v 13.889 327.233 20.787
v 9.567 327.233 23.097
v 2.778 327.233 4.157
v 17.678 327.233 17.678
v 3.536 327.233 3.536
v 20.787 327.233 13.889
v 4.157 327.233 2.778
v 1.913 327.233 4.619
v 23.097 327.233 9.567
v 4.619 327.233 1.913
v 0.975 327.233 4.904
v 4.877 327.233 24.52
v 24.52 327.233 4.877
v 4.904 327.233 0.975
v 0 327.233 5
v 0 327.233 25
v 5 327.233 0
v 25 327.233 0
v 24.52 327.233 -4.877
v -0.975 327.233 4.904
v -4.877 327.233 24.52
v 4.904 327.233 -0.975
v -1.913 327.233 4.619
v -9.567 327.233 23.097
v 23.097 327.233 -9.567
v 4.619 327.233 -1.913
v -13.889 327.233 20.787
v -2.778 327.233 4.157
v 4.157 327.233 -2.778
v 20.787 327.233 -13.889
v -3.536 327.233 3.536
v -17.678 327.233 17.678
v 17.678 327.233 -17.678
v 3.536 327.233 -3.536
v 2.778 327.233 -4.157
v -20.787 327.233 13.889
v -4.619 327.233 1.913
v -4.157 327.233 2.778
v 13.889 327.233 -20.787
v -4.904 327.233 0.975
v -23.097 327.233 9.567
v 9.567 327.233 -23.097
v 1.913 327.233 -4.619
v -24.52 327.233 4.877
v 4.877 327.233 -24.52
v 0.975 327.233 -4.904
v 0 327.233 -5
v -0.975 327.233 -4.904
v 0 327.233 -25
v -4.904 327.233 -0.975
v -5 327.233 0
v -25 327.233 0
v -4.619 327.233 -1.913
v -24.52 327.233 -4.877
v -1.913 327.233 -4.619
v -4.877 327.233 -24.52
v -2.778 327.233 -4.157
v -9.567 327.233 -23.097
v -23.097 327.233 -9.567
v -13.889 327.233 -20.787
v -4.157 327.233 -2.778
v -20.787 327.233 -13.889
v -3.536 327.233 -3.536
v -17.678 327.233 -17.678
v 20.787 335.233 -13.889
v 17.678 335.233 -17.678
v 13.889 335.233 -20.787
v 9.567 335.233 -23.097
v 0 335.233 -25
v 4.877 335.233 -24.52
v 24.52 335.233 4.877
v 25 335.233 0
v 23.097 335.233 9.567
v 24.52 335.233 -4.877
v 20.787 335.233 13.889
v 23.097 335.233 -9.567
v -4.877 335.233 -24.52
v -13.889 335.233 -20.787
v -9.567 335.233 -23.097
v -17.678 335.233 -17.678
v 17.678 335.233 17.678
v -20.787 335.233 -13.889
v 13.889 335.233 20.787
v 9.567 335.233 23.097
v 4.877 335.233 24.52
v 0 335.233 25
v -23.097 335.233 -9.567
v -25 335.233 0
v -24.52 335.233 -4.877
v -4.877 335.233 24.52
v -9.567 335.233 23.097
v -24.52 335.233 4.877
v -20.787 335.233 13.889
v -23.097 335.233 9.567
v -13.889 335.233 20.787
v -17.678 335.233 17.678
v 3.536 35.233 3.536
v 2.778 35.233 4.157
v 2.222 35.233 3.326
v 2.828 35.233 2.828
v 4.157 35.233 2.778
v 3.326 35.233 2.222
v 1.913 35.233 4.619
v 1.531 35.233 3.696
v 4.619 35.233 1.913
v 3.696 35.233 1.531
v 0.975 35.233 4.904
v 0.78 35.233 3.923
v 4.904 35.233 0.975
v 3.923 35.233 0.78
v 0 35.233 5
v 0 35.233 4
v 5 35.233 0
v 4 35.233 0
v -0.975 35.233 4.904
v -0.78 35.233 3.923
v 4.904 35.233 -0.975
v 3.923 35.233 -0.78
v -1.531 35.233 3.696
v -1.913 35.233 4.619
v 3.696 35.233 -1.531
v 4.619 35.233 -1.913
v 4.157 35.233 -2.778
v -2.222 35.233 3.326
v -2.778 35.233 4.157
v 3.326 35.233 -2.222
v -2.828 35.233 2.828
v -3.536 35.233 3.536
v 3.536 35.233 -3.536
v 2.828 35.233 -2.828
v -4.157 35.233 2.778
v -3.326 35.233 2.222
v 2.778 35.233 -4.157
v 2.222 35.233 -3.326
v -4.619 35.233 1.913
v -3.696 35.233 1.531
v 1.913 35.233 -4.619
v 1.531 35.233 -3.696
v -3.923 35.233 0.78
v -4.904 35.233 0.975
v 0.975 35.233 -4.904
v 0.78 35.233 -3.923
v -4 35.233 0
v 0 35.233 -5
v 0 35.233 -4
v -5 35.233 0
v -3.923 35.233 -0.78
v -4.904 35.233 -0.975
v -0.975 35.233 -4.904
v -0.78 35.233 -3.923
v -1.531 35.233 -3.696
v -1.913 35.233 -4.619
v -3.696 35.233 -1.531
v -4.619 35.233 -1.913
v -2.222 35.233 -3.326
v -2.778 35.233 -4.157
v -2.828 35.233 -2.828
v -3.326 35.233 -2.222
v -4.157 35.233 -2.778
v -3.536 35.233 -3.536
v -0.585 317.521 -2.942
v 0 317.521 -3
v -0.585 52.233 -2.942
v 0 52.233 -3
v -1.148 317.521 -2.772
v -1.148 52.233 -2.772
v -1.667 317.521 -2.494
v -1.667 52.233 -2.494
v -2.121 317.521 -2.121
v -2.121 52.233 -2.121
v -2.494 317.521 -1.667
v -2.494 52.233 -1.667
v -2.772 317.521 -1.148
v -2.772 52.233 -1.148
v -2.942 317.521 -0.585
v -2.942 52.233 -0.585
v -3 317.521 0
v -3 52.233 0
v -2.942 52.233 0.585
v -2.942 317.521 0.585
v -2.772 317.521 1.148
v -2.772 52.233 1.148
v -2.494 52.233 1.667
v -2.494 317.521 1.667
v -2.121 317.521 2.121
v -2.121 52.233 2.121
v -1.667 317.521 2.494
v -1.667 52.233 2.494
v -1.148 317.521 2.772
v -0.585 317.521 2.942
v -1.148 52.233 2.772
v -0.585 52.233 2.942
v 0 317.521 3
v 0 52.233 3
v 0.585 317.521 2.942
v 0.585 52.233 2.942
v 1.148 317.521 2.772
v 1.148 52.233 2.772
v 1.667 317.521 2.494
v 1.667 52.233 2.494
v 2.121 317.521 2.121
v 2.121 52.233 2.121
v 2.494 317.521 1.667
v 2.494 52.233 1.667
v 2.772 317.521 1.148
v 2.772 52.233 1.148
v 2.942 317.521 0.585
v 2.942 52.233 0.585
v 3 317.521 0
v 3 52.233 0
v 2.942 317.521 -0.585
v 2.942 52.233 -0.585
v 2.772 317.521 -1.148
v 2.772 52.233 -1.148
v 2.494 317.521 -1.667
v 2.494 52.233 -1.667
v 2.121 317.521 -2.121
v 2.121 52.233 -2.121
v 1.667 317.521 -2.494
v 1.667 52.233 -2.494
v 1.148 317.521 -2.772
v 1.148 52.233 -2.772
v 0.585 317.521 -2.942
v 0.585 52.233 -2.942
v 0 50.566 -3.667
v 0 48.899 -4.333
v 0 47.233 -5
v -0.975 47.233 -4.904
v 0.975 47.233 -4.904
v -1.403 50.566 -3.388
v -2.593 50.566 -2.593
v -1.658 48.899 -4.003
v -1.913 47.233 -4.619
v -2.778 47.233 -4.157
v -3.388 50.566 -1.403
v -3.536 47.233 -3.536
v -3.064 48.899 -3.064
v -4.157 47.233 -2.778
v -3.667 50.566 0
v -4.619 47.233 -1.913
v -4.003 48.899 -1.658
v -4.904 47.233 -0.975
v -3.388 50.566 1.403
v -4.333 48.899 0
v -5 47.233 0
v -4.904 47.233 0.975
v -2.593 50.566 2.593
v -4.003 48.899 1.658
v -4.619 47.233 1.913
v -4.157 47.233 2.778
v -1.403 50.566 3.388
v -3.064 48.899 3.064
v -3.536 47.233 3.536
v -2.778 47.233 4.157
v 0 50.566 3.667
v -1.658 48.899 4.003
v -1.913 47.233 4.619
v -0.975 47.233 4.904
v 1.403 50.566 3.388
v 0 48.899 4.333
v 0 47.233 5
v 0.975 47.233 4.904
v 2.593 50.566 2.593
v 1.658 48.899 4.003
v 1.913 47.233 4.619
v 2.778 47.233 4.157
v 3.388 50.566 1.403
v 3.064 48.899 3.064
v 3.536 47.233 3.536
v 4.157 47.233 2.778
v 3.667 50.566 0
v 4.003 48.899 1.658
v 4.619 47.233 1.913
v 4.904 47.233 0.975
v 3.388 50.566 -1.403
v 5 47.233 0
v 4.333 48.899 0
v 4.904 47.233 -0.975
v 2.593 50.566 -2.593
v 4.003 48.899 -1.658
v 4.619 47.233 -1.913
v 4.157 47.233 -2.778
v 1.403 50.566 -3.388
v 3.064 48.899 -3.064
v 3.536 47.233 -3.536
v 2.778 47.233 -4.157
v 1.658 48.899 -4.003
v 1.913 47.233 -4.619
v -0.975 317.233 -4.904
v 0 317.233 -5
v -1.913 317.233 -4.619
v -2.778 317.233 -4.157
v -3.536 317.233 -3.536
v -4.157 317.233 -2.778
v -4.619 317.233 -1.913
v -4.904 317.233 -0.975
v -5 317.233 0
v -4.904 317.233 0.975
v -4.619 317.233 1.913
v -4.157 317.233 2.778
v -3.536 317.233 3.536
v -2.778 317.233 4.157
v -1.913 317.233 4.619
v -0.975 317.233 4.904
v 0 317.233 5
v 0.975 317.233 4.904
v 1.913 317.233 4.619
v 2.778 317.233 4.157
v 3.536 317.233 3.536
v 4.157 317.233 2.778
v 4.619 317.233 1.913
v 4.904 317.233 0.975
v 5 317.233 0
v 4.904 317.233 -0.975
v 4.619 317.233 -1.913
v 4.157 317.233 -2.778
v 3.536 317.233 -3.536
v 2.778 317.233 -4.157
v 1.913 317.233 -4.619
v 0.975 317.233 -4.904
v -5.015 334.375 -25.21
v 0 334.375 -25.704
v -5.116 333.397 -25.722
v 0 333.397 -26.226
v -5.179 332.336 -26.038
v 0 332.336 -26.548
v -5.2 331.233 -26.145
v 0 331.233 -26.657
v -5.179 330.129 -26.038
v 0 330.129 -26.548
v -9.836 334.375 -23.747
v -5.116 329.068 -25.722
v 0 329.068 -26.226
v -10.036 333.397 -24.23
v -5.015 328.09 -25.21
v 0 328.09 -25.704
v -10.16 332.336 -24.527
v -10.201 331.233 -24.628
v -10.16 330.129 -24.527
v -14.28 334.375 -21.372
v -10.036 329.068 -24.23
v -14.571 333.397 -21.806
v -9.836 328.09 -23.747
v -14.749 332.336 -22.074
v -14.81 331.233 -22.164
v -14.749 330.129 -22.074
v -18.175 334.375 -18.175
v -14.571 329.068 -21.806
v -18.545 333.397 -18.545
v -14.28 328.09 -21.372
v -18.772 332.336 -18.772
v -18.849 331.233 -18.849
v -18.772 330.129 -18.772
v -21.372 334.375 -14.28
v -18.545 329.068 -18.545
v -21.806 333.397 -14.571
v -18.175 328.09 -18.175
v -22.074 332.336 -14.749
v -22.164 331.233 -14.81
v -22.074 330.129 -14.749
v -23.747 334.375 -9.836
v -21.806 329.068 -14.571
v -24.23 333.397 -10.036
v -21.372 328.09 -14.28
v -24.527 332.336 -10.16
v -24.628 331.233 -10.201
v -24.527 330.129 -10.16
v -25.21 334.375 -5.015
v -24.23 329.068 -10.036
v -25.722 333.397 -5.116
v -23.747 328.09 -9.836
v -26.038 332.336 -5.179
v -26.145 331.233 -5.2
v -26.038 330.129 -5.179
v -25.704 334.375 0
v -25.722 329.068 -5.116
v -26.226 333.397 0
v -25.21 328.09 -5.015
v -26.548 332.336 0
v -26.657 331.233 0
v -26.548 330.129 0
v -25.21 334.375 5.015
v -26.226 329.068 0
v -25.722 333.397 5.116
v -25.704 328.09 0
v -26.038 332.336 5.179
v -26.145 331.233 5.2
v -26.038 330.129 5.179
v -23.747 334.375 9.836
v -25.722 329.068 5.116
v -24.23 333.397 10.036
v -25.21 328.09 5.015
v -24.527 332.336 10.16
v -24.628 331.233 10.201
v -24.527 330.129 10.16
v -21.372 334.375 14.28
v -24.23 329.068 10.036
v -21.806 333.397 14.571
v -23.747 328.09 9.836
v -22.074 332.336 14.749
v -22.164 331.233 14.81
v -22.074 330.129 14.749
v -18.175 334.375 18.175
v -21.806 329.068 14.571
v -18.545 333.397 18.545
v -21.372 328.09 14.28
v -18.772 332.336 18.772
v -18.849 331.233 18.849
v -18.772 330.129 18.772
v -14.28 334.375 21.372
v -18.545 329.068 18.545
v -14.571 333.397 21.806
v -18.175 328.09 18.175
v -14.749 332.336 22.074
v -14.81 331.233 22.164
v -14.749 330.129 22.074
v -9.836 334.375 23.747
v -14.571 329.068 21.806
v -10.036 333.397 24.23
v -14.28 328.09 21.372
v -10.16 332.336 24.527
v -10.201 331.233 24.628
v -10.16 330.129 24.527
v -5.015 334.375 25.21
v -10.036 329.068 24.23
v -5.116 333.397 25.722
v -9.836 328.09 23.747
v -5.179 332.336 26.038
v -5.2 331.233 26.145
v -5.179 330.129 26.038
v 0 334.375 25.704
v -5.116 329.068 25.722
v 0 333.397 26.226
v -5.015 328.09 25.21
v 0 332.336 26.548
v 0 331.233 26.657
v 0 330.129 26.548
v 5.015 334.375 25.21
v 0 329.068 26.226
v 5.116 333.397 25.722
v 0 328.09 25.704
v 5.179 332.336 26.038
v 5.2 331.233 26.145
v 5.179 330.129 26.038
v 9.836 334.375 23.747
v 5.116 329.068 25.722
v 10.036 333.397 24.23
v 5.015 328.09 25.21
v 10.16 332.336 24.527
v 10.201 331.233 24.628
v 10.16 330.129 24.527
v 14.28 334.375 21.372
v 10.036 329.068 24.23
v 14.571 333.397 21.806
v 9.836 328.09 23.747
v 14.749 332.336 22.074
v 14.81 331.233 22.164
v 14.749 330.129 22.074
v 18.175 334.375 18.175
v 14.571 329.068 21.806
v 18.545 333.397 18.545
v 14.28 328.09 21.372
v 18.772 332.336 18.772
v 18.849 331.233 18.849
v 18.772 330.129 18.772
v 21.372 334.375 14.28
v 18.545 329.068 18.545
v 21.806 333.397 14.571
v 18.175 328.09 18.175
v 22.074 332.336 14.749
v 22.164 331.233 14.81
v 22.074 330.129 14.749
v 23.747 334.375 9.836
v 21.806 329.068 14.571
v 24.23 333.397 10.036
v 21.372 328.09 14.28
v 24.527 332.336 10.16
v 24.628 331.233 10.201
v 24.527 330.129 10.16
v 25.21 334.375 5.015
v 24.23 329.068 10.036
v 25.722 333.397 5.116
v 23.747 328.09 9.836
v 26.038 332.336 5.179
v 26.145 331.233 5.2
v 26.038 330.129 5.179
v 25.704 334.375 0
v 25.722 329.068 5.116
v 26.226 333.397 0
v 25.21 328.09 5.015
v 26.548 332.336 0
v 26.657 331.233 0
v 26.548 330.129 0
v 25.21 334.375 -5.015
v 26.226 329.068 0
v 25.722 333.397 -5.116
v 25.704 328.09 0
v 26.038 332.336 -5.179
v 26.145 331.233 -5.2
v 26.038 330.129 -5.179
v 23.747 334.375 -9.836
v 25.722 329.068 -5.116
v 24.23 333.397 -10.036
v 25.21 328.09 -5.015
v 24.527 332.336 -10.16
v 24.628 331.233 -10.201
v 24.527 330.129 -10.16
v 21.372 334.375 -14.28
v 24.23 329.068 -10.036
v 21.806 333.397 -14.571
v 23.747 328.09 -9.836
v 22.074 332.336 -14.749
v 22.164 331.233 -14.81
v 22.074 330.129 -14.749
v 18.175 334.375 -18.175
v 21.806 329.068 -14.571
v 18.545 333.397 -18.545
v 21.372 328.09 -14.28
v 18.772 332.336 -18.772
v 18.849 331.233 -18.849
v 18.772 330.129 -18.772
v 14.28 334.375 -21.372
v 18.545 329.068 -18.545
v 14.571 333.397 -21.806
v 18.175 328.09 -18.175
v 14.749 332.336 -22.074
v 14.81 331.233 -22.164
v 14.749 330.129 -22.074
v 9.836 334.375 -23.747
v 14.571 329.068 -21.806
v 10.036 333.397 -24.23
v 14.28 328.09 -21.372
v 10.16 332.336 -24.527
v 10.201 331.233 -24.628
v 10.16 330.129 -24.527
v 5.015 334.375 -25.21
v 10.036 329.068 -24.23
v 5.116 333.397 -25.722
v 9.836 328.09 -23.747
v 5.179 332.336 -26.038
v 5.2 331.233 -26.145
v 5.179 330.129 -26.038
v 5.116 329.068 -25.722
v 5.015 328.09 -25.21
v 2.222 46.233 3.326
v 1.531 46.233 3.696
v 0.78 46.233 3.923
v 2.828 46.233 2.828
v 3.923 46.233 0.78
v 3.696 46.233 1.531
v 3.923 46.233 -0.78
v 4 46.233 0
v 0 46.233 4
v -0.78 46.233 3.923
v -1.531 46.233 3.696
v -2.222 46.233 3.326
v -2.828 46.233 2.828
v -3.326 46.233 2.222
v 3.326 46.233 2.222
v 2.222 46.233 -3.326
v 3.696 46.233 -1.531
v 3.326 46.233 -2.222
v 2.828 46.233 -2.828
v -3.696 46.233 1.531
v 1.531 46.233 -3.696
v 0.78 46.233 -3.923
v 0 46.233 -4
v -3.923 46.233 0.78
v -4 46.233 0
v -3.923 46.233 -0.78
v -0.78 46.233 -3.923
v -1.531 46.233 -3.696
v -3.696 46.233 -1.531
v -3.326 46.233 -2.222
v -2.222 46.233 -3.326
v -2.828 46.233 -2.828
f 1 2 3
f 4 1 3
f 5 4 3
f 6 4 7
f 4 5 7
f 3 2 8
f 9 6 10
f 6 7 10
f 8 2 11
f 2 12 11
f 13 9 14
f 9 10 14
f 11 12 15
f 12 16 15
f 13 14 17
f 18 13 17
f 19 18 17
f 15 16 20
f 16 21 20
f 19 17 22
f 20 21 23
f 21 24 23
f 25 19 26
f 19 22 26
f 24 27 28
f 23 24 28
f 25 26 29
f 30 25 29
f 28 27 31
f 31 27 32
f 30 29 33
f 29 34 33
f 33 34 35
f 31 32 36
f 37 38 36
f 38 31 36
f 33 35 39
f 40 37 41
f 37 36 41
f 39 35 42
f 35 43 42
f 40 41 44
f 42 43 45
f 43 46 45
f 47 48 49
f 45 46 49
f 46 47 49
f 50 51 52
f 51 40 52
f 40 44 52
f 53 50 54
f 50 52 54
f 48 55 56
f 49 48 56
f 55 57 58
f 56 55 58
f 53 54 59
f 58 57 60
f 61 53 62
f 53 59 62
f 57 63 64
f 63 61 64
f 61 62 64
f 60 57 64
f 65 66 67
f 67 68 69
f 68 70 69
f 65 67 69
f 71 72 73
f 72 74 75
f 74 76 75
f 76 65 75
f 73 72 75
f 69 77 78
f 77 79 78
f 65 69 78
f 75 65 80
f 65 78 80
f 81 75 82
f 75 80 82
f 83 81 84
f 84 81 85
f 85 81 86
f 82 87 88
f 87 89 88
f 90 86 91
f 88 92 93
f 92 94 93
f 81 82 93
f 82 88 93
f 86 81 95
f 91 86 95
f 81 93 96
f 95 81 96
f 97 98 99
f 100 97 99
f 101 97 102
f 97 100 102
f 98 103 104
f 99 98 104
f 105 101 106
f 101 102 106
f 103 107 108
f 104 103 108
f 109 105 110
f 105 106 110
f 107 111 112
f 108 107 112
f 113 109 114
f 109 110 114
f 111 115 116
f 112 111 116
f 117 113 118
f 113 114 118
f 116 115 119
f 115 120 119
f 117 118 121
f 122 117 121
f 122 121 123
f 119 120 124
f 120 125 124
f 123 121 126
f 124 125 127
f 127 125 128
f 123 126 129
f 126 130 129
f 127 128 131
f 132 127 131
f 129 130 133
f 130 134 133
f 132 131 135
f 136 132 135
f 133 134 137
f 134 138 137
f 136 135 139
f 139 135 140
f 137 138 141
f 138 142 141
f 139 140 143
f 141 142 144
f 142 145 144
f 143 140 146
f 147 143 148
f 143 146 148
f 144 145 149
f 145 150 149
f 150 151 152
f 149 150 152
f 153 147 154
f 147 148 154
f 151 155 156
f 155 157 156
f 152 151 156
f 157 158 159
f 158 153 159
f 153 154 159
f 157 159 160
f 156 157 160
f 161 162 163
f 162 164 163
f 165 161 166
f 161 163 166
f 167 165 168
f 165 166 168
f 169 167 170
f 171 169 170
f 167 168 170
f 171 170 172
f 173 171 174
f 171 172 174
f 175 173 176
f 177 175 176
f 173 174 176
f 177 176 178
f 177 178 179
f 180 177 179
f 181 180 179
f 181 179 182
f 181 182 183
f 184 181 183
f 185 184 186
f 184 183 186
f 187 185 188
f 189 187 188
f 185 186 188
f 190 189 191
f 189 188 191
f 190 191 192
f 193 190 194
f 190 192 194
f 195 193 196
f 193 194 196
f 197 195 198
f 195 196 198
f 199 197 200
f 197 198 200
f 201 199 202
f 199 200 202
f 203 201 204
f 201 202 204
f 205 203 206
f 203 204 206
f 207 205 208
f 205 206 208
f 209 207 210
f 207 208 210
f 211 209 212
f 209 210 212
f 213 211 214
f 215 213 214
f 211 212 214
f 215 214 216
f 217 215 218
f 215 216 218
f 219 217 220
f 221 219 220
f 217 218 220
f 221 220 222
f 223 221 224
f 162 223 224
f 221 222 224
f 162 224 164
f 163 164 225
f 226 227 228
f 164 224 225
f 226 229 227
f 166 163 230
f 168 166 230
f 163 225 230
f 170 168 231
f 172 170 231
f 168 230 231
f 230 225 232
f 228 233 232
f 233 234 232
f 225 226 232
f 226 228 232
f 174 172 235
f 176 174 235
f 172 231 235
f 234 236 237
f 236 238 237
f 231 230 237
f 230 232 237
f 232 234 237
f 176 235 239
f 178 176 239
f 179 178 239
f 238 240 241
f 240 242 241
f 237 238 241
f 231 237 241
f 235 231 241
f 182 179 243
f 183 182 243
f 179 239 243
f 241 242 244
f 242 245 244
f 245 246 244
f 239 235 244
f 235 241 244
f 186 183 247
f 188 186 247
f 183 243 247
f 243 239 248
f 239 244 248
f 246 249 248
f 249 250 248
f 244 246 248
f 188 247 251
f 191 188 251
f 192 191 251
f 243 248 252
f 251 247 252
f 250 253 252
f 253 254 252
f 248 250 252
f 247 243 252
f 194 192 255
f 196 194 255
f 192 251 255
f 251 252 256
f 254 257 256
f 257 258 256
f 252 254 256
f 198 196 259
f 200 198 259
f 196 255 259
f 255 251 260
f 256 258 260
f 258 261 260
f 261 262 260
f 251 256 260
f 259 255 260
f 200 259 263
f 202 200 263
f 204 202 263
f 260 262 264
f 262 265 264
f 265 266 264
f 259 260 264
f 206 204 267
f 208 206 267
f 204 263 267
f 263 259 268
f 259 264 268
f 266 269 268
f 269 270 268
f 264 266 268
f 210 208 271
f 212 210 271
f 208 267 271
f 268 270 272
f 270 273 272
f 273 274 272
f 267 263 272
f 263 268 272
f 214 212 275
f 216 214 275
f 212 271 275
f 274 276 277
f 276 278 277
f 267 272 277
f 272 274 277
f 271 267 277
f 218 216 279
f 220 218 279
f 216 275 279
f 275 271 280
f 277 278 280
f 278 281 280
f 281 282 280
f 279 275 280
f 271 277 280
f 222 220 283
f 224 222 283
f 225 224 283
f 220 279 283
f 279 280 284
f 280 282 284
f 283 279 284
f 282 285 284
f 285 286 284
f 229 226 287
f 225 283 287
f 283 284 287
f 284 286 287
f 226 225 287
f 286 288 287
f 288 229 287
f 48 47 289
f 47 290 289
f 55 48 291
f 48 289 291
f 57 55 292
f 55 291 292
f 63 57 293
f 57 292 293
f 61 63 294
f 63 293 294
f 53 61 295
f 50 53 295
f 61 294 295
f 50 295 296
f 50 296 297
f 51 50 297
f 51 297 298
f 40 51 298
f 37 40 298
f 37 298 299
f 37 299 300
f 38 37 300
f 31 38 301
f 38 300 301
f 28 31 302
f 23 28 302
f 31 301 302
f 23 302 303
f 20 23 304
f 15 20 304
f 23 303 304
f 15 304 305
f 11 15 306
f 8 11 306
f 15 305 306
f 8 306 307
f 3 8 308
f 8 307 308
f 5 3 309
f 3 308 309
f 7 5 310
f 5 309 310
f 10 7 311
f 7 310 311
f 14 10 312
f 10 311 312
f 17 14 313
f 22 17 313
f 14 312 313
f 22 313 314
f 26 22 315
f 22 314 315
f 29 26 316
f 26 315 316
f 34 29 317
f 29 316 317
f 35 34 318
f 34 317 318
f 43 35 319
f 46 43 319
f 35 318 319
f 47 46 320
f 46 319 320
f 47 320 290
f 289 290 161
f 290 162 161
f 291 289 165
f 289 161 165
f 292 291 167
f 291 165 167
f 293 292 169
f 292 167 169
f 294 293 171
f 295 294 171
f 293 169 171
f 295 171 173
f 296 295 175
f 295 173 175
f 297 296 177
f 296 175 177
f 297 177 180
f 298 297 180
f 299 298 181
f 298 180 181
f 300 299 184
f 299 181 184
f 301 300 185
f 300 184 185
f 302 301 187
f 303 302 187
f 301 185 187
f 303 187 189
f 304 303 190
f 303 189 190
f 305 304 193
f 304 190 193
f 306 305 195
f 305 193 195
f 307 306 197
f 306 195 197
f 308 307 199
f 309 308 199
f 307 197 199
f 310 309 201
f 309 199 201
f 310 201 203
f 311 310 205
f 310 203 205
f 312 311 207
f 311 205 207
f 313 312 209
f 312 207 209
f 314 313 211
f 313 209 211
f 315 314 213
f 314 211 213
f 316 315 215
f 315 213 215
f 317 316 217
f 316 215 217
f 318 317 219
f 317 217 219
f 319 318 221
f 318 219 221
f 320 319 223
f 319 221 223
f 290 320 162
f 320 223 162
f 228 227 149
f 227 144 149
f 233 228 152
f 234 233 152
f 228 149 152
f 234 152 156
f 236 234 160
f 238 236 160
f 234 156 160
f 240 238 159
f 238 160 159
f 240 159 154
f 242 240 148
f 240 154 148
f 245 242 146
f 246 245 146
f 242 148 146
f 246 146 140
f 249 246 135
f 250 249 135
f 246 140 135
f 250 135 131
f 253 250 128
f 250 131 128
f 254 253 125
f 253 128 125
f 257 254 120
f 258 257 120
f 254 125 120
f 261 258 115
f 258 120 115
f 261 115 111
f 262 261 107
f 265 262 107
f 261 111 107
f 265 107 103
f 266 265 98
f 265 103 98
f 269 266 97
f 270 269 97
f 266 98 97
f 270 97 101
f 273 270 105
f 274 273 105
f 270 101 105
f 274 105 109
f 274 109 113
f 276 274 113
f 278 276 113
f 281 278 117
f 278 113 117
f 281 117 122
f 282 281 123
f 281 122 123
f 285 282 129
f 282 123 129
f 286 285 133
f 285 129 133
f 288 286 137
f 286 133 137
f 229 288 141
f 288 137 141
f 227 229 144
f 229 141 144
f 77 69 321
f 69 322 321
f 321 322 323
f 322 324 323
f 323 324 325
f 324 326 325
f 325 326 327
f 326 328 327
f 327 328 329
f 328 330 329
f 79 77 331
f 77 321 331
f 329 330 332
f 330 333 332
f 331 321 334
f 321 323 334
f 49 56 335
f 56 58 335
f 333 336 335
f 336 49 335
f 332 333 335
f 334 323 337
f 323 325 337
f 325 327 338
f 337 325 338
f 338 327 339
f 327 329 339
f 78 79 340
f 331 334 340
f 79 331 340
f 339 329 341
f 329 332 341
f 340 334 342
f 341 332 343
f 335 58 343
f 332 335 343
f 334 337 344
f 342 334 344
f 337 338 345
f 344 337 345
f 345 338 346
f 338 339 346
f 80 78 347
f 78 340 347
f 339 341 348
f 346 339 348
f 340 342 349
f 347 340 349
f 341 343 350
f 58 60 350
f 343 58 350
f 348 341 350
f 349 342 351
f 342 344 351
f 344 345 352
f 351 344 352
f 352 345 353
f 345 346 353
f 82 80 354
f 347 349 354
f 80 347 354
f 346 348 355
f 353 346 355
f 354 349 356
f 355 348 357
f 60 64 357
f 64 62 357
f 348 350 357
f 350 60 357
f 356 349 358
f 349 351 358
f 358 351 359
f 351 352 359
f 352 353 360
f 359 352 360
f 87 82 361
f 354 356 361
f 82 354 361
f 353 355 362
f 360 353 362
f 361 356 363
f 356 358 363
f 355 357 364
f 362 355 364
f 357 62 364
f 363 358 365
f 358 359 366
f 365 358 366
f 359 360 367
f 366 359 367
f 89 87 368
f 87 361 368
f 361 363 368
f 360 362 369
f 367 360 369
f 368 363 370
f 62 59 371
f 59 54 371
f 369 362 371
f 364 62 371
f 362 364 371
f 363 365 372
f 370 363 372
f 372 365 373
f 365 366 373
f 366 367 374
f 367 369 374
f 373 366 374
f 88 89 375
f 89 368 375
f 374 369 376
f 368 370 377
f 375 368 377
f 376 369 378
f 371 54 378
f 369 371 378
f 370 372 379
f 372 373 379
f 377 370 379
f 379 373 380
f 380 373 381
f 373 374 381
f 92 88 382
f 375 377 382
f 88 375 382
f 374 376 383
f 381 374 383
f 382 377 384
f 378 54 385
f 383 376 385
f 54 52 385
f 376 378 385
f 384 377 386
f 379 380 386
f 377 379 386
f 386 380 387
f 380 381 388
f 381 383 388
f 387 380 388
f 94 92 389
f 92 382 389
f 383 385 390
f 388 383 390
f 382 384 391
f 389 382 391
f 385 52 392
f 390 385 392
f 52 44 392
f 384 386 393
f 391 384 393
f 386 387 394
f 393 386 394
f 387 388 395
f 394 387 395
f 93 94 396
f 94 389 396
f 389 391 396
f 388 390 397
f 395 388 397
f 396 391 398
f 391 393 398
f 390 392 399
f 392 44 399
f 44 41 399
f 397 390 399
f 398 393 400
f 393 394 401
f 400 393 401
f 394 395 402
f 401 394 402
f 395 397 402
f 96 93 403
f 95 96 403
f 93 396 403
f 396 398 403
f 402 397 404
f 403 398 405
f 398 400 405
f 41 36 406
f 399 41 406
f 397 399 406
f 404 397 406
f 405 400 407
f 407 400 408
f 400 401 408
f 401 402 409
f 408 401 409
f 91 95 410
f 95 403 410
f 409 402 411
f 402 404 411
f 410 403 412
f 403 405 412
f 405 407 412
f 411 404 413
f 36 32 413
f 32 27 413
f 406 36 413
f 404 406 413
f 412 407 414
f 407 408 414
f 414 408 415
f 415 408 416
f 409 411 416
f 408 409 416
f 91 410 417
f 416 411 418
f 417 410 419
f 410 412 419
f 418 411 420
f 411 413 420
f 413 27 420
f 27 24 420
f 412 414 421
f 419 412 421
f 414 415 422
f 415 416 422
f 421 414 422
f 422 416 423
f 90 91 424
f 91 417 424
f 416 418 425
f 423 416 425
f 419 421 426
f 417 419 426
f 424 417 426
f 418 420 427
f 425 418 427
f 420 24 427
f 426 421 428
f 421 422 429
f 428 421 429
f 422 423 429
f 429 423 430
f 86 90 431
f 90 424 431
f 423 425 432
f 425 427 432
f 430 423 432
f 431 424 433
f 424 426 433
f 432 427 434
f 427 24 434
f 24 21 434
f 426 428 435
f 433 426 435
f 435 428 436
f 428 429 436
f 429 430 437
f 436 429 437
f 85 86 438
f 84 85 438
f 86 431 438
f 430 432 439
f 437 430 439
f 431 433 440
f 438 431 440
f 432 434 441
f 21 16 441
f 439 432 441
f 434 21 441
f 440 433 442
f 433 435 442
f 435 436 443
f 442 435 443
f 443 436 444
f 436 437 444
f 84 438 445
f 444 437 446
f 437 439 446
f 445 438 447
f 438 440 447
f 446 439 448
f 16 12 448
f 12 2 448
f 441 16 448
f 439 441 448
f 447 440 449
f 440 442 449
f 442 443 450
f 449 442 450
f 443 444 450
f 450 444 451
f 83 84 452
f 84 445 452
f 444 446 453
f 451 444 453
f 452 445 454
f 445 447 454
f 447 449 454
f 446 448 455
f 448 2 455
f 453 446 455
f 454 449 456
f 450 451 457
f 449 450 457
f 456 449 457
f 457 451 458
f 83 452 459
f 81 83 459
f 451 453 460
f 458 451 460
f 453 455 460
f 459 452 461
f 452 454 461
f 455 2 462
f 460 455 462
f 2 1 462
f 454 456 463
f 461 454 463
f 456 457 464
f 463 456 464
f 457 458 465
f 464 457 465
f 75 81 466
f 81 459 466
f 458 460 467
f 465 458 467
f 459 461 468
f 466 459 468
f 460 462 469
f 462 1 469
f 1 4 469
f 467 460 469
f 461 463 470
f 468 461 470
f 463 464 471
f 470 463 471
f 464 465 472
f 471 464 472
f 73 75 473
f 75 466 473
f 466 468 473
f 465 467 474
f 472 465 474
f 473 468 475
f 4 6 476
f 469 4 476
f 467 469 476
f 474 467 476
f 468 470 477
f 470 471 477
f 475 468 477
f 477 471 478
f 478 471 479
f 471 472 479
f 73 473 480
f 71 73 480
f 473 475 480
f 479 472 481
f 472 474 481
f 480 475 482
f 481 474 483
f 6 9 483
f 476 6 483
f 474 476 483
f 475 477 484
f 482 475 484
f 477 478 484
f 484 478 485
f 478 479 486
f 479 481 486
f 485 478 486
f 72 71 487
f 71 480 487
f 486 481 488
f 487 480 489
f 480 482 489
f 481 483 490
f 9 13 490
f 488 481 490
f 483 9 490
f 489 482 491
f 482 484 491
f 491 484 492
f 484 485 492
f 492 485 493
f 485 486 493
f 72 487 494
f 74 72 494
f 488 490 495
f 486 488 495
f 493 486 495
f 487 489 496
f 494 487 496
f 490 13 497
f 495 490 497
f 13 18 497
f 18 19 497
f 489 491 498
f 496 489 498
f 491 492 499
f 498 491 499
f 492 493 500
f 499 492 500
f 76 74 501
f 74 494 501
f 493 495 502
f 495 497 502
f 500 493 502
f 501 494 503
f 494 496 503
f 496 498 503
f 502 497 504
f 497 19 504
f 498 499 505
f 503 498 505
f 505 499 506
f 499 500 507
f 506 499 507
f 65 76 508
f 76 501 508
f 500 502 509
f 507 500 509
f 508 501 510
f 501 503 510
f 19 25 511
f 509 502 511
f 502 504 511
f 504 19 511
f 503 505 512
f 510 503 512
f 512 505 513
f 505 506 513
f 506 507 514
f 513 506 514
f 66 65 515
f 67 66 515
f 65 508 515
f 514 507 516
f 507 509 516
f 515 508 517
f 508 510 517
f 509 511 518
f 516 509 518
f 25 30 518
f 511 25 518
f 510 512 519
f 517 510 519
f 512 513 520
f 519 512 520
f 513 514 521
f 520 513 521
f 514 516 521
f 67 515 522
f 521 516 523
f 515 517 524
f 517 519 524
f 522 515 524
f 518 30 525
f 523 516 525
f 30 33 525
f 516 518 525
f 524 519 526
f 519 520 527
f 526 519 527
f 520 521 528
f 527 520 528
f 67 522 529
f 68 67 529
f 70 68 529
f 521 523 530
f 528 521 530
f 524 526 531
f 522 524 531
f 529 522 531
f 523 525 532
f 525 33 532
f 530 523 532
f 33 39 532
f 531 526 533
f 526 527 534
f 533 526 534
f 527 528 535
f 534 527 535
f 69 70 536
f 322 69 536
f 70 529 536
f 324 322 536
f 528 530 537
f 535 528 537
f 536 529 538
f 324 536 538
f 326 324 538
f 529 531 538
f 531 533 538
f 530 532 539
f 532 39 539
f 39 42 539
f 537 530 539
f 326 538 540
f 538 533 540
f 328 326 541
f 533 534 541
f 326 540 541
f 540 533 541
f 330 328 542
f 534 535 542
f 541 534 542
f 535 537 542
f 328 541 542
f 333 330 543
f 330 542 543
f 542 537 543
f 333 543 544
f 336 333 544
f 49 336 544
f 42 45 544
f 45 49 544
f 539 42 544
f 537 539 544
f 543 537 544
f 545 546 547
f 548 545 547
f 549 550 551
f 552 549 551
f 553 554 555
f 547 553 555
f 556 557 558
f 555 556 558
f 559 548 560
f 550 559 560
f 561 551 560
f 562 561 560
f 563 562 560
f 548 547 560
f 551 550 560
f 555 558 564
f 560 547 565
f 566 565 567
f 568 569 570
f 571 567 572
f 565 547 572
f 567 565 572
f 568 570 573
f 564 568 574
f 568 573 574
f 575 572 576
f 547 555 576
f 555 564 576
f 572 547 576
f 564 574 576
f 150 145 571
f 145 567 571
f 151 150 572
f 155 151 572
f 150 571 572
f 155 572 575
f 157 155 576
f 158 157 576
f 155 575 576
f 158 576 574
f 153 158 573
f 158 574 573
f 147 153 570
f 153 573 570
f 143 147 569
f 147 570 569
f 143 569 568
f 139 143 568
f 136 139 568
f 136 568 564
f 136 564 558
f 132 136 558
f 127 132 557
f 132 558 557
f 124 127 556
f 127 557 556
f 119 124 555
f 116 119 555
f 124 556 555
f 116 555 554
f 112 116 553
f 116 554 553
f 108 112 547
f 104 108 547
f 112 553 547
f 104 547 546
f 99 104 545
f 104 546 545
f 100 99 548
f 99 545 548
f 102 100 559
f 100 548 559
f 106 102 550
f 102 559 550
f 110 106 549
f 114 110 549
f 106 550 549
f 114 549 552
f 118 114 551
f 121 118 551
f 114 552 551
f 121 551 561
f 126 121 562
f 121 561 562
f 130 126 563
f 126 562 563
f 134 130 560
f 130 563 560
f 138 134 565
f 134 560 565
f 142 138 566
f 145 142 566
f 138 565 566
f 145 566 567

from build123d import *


with BuildPart() as part:
    # Sketch1 → Revolve2 (revolve)
    with BuildSketch(Plane.XY, mode=Mode.PRIVATE) as revolve2_sk:
        with BuildLine():
            Line((-5, 327.232699925), (-5, 317.232699925))
            add(Edge.make_bspline(
                [(-5, 317.232699925), (-3.994069006, 317.33794331), (-3, 317.520687178)],
                knots=[0, 0, 0, 1, 1, 1], degree=2))
            Line((-3, 317.520687178), (-3, 52.232699925))
            Line((-3, 52.232699925), (-5, 47.232699925))
            Line((-5, 47.232699925), (-5, 35.232699925))
            Line((-5, 35.232699925), (-4, 35.232699925))
            Line((-4, 35.232699925), (-4, 46.232699925))
            Line((-4, 46.232699925), (0, 46.232699925))
            Line((0, 46.232699925), (0, 335.232699925))
            Line((0, 335.232699925), (-25, 335.232699925))
            ThreePointArc((-25, 335.232699925), (-26.656854249, 331.232699925), (-25, 327.232699925))
            Line((-25, 327.232699925), (-5, 327.232699925))
        make_face()
    revolve(revolve2_sk.sketch.rotate(Axis((0, 0, 0), (0, 1, 0)), 270), axis=Axis((0, 0, 0), (0, 1, 0)))


solid = part.part
